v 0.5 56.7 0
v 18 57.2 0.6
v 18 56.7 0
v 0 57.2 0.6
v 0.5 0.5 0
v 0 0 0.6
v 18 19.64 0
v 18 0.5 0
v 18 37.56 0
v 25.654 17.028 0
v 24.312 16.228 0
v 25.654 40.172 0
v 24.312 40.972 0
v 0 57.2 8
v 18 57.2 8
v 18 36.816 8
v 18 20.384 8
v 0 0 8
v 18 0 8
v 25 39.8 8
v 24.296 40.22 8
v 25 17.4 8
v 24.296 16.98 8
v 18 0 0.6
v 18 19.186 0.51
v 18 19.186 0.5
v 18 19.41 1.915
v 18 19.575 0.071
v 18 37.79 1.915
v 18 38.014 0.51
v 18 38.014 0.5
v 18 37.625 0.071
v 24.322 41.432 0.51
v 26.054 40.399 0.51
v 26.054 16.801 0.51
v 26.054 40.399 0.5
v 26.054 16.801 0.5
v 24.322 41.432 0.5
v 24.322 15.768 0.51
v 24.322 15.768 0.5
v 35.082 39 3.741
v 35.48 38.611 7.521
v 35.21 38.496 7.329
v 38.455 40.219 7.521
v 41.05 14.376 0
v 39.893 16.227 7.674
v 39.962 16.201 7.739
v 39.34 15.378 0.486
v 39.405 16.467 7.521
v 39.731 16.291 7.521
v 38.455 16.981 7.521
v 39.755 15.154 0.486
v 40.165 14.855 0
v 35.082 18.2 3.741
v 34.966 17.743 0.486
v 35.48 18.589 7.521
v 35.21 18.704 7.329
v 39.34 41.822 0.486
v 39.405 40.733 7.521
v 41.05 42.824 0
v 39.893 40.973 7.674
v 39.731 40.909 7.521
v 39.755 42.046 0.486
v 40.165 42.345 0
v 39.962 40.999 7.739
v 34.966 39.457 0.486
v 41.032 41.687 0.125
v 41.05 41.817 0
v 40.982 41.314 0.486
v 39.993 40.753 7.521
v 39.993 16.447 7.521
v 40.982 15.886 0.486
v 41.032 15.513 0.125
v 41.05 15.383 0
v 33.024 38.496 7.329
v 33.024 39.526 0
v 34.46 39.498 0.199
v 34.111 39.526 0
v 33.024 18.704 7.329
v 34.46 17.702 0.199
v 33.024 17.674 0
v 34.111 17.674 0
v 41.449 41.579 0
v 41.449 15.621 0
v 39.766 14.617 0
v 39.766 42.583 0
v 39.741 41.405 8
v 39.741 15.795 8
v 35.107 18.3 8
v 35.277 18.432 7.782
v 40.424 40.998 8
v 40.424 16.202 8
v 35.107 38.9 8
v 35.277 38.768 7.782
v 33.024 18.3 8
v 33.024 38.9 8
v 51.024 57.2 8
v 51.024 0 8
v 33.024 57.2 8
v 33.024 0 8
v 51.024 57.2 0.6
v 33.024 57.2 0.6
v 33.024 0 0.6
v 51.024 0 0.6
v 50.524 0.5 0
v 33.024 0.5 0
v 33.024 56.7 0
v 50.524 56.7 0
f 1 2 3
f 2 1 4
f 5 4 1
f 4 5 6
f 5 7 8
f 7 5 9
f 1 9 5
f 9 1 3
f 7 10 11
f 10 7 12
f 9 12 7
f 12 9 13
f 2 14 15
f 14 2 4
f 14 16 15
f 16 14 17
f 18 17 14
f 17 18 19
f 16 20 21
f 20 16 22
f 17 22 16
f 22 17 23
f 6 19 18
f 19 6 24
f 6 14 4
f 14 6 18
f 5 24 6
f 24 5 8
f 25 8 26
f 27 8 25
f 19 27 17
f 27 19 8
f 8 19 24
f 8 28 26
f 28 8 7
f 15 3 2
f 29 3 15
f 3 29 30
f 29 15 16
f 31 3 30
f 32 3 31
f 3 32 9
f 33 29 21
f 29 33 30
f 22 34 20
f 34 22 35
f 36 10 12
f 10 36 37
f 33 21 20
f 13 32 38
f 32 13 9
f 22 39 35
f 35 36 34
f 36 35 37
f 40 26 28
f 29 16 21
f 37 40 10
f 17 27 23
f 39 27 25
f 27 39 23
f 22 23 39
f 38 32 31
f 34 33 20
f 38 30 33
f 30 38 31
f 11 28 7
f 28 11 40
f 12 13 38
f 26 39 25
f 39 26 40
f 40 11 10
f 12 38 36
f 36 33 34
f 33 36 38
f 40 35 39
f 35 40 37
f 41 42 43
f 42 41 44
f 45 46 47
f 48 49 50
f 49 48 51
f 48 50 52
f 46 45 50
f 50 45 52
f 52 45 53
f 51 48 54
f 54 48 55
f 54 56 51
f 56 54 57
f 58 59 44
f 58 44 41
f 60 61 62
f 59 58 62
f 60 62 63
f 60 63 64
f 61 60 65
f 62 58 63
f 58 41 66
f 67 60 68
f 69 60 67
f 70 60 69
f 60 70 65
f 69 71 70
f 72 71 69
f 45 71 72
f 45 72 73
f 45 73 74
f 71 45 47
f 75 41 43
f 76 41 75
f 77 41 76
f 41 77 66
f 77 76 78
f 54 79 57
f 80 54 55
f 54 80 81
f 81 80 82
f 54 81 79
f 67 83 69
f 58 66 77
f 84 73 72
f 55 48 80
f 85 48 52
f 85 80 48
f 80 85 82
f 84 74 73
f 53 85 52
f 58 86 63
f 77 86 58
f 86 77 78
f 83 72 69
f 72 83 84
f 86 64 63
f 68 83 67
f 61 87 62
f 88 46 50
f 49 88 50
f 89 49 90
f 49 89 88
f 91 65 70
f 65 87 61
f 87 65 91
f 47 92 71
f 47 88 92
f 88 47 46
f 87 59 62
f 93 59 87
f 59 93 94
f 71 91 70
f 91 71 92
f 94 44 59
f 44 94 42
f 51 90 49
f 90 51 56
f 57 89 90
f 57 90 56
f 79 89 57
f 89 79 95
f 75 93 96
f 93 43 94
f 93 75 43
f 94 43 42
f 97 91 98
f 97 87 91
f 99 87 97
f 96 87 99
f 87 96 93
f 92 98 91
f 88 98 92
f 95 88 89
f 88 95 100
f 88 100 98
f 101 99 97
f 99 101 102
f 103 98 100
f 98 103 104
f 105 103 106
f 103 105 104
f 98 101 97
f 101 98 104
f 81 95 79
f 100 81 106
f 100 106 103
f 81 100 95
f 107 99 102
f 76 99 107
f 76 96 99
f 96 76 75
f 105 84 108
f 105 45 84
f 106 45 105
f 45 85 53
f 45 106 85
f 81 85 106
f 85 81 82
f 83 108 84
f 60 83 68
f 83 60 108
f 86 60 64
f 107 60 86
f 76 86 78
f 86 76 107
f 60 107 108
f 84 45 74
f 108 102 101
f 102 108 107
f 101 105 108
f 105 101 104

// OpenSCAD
// Print-this-first joint coupon: the production dovetail key and the
// production socket as two loose stubs. Lower the socket stub onto the key
// stub; tune `joint_clear` here before printing a rack. See NOTES.md for
// the ladder.
include <tape-strip-rack.scad>

part = "joint-coupon";
